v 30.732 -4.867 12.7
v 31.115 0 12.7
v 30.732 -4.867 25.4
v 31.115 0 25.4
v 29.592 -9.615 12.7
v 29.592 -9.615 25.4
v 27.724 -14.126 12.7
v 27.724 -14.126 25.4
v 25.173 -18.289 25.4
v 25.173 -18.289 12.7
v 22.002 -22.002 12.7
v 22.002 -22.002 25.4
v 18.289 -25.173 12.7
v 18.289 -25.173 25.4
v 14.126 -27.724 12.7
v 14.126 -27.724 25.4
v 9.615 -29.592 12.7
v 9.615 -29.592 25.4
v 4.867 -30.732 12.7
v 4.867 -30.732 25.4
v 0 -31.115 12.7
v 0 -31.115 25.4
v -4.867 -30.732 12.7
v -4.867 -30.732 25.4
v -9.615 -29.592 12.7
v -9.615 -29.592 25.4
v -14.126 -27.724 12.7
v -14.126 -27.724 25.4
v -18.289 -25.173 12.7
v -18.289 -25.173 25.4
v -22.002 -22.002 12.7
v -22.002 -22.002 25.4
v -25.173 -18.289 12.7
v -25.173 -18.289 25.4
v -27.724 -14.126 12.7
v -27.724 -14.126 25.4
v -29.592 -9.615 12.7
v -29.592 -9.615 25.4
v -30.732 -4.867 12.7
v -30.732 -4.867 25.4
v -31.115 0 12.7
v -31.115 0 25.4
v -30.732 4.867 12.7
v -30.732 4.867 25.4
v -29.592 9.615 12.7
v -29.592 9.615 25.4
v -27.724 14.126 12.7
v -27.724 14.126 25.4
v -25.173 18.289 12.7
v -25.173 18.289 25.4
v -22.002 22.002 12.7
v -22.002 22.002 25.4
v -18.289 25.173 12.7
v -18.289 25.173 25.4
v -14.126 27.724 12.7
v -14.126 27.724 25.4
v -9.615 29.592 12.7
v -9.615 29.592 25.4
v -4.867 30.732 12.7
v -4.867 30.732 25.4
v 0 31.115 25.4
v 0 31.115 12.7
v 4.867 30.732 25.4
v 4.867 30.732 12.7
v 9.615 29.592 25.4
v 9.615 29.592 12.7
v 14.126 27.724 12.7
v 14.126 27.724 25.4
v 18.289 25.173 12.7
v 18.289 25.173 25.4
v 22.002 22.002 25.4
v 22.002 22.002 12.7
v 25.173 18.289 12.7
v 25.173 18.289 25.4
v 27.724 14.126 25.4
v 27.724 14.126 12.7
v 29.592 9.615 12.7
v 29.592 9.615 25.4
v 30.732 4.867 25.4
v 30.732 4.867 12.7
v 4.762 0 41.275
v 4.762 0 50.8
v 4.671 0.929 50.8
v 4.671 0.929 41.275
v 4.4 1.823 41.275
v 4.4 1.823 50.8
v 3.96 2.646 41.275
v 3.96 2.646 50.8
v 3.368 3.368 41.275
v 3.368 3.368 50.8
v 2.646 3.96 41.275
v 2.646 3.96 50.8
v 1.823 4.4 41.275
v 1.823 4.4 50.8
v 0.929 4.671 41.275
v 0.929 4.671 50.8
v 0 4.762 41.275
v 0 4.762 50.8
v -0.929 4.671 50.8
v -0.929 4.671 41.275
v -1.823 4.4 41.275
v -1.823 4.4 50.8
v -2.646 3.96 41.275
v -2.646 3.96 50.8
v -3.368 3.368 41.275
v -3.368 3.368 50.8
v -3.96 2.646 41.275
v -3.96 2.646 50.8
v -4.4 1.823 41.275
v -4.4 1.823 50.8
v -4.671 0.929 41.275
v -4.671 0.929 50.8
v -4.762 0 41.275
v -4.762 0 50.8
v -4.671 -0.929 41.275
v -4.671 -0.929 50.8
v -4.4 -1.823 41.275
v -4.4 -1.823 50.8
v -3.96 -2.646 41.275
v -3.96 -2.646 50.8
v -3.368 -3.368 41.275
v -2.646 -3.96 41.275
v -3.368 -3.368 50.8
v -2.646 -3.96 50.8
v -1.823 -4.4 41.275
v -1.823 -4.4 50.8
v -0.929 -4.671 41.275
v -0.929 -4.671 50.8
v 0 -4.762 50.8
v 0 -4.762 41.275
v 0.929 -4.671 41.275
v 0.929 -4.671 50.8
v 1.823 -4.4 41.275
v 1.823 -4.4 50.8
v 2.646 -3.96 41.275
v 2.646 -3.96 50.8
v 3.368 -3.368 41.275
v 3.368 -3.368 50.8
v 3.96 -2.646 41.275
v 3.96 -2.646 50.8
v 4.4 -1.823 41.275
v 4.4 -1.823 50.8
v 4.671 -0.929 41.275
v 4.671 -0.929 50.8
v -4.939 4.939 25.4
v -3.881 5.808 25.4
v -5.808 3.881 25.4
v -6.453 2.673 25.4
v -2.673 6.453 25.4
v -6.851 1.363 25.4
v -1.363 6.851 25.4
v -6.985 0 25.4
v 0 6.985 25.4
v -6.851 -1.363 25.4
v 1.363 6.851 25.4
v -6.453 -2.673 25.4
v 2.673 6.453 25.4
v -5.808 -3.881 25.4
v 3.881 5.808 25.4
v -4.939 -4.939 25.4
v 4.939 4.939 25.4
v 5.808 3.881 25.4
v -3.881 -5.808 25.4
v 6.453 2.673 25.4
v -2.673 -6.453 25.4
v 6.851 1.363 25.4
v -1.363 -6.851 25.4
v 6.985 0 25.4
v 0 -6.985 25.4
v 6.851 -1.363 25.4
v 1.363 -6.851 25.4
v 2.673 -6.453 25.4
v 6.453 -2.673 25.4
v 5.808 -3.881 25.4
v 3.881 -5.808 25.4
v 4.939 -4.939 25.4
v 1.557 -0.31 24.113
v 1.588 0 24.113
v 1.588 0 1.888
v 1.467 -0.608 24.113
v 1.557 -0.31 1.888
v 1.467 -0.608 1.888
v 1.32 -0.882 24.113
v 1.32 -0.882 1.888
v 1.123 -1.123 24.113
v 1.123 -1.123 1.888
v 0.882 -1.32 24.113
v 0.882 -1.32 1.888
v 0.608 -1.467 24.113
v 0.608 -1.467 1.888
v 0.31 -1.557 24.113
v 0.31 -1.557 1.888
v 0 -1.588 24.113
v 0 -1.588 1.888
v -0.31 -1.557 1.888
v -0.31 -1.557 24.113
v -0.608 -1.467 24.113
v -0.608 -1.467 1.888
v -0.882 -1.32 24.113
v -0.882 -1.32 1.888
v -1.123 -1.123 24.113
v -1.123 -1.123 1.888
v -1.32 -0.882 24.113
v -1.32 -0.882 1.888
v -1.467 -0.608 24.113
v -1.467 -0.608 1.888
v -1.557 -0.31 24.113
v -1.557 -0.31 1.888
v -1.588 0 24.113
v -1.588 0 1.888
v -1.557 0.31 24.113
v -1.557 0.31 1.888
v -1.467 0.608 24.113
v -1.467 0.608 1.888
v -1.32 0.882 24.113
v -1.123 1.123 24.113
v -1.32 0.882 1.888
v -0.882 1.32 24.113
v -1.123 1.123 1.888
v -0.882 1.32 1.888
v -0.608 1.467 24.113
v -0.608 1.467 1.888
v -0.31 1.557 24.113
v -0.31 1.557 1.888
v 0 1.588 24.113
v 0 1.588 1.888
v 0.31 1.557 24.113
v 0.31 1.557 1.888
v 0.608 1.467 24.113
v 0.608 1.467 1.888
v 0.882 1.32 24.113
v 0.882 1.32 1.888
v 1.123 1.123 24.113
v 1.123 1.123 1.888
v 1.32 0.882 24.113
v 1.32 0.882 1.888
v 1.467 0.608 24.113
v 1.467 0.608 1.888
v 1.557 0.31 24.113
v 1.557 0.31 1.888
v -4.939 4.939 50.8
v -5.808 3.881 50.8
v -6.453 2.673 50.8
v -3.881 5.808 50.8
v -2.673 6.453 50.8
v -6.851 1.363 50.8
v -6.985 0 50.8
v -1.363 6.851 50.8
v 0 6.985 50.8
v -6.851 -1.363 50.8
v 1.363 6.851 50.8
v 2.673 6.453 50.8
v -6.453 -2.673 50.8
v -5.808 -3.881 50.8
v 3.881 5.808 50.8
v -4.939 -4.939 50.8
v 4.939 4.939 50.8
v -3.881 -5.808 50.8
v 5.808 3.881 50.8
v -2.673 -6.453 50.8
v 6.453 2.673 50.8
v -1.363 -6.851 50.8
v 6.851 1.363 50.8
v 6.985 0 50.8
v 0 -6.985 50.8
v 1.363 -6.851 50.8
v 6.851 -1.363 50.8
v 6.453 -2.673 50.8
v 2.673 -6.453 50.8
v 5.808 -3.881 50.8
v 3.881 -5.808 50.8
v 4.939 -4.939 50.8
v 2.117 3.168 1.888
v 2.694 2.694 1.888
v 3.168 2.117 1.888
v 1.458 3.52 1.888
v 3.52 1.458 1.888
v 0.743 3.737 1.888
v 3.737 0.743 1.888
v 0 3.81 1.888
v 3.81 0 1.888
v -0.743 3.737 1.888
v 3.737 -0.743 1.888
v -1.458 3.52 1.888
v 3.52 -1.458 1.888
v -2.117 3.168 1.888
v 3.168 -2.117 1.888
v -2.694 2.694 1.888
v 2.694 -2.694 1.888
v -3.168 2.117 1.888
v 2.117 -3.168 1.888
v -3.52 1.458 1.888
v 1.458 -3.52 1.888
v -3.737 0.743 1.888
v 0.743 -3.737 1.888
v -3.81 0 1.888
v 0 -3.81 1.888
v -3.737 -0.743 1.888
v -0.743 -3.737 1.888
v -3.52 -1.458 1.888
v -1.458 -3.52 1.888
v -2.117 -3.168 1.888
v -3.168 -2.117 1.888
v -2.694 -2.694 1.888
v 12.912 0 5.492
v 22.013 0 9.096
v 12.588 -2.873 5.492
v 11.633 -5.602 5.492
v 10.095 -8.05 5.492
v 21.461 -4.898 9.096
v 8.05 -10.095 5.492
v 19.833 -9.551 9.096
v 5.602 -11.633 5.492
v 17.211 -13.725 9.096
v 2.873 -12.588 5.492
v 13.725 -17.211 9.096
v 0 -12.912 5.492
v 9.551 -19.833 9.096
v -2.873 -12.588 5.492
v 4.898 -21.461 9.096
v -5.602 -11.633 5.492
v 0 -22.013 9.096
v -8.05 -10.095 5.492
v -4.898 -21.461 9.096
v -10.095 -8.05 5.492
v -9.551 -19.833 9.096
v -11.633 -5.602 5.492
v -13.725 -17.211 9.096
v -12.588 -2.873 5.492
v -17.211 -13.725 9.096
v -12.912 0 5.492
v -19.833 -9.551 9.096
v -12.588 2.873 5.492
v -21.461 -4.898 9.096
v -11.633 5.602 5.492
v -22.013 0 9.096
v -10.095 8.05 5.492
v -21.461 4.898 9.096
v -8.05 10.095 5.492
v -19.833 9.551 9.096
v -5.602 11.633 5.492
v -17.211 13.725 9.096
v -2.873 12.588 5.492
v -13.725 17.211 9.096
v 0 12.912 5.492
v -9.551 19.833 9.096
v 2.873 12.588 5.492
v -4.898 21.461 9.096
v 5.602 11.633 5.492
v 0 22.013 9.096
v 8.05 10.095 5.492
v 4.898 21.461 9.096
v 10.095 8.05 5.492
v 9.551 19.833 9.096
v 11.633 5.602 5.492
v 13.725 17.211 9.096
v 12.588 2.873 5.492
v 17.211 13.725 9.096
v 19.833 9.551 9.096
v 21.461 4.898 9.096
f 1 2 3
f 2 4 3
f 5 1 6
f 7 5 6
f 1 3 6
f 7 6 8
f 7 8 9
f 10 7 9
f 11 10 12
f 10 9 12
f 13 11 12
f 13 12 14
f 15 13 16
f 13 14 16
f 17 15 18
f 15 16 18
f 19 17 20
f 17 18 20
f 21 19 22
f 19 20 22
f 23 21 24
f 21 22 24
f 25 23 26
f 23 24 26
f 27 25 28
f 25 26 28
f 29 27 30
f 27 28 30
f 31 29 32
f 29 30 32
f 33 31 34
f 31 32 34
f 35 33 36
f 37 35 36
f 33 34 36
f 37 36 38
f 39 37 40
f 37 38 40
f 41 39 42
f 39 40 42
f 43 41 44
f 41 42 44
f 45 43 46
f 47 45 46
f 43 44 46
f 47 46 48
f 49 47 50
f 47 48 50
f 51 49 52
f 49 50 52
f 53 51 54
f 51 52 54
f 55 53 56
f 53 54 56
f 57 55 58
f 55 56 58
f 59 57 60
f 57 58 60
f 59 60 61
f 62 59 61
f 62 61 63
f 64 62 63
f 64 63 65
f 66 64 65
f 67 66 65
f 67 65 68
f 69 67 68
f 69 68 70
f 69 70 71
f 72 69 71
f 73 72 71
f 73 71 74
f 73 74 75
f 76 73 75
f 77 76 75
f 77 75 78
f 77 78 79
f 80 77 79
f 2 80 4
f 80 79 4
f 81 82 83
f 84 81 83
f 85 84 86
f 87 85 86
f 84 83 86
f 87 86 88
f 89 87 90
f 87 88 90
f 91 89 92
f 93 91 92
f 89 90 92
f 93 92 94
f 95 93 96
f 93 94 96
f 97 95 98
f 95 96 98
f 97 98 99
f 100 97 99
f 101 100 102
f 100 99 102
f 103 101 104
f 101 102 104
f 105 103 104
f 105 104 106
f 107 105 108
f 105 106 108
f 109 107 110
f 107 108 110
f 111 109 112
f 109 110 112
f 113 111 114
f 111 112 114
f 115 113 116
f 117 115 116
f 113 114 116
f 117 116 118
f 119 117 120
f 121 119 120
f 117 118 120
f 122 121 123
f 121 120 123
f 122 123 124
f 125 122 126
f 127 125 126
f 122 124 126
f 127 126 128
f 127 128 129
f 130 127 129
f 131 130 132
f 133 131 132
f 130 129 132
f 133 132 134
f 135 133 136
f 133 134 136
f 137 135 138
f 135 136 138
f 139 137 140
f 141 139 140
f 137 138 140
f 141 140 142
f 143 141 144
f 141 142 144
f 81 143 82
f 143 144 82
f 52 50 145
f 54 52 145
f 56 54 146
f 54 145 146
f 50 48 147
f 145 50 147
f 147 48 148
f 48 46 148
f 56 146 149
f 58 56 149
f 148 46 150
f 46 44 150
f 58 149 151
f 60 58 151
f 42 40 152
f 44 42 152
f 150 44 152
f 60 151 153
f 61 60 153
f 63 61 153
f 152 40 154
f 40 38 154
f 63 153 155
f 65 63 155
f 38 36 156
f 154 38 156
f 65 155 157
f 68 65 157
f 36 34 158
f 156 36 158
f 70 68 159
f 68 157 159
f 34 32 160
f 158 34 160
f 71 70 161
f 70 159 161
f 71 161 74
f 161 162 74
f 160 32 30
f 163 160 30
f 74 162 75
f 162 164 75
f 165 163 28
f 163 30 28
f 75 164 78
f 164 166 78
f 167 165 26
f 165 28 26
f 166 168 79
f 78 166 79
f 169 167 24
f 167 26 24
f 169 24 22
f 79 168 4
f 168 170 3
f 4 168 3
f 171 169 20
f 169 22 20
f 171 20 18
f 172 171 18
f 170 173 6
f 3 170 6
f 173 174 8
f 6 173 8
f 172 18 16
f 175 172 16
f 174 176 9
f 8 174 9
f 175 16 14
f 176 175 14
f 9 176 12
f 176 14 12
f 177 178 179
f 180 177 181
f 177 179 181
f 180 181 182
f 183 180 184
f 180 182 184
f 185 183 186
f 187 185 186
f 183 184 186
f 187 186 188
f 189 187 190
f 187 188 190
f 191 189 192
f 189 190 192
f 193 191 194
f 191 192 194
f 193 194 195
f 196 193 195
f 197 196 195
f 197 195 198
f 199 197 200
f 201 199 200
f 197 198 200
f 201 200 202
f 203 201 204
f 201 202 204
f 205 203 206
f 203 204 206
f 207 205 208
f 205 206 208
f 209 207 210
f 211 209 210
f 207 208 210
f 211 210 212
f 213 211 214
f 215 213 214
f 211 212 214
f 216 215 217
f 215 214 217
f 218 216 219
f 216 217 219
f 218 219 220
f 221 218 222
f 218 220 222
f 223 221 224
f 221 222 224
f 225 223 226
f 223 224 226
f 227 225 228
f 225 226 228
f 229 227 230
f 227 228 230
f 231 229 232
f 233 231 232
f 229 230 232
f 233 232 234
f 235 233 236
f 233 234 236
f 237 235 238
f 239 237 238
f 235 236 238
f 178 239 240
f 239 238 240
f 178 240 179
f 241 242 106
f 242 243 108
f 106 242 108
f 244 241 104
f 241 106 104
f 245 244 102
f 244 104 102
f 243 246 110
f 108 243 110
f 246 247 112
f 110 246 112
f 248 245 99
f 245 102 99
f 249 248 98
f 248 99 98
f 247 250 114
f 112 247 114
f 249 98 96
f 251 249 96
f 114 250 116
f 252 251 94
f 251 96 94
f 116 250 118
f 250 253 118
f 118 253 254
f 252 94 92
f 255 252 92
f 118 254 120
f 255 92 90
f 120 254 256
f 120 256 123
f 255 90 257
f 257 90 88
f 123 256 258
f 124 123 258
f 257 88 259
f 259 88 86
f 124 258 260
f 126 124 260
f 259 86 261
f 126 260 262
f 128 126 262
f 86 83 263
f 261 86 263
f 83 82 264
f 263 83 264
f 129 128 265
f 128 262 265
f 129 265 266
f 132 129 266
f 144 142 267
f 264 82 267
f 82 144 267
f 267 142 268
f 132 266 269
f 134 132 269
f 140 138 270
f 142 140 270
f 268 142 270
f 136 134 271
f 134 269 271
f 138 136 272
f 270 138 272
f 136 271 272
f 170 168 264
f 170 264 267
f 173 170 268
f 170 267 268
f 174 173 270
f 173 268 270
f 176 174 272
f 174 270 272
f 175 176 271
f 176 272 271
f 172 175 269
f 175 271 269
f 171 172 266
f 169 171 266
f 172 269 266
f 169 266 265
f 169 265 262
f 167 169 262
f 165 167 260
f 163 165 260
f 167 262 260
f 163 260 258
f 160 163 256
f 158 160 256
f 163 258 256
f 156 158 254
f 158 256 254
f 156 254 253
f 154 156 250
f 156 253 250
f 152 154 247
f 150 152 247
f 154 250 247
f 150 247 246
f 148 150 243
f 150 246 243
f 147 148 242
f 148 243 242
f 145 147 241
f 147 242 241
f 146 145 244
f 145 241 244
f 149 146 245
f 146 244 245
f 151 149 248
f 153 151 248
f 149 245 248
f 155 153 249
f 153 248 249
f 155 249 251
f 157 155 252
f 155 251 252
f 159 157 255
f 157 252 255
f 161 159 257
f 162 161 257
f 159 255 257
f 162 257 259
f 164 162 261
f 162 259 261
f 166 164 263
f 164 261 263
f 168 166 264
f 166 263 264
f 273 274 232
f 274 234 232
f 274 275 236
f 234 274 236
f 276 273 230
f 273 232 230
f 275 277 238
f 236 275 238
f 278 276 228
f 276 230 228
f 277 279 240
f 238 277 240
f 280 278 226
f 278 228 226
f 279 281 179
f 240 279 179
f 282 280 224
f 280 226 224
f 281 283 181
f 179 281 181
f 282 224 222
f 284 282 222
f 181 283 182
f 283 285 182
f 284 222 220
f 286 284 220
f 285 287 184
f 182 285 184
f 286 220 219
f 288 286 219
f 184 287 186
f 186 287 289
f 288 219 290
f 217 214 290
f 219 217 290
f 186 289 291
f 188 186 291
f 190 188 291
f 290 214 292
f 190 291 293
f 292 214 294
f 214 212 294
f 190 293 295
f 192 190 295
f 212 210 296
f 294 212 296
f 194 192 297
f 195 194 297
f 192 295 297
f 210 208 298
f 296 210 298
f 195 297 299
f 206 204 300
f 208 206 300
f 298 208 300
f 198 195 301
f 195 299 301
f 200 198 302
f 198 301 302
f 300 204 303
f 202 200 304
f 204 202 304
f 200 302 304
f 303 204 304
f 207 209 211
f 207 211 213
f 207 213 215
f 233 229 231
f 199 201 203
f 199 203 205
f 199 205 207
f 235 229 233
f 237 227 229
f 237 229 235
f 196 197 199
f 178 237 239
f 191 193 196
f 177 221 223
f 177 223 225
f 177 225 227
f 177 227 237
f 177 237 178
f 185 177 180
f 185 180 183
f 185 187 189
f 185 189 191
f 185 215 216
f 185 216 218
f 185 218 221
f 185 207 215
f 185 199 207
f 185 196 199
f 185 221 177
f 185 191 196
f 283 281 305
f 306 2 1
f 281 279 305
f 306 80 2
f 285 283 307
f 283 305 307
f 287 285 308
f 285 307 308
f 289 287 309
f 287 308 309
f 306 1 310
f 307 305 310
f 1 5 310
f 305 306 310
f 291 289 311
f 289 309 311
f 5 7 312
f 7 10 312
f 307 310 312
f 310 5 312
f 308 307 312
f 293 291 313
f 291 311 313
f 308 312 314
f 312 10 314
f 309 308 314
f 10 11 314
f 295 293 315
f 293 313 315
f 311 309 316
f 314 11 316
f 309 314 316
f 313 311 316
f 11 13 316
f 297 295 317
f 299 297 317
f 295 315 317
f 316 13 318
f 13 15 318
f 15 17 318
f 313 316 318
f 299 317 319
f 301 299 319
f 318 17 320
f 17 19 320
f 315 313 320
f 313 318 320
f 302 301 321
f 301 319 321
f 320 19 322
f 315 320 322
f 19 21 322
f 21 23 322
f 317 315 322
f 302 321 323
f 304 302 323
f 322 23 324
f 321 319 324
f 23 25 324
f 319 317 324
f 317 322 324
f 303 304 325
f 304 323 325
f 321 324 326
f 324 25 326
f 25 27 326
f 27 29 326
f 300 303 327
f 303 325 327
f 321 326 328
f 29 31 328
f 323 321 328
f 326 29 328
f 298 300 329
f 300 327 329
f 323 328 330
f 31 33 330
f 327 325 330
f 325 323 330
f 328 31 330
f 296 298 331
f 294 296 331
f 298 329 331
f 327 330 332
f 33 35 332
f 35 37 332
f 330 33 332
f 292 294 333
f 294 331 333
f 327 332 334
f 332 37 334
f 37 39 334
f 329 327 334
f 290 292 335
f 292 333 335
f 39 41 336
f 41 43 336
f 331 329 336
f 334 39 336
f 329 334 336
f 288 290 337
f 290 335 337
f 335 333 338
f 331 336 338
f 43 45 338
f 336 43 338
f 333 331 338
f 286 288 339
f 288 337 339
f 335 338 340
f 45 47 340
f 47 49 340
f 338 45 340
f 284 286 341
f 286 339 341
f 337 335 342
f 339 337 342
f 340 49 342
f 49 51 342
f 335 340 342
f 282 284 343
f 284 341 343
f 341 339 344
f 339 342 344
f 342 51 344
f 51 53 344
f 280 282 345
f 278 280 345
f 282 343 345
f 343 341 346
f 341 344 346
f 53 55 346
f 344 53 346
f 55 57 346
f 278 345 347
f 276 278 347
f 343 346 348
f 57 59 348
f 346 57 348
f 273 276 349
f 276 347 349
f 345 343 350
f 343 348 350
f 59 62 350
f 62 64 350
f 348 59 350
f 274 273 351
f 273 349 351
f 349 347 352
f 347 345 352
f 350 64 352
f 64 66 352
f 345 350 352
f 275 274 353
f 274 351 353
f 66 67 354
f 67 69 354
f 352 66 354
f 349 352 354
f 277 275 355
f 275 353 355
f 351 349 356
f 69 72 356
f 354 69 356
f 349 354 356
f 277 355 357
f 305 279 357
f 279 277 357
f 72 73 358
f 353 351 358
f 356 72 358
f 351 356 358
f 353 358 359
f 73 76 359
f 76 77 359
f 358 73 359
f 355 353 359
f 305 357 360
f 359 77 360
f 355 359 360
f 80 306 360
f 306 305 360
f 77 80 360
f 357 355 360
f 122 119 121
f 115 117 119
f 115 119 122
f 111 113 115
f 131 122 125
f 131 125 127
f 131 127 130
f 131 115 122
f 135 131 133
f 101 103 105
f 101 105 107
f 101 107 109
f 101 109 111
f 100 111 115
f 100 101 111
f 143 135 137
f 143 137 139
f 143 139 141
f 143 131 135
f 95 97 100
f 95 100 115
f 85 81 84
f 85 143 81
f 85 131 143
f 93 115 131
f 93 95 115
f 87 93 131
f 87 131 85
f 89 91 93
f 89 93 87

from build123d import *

# Parameters (mm, degrees)
F2_R     = 4.7625
F3_DEPTH = 9.525
F4_R     = 1.5875
F5_DEPTH = 22.225


with BuildPart() as f1:
    # F0 (on Front) → F1 (revolve)
    with BuildSketch(Plane.XZ):
        Polygon((3.81, 1.888357), (31.115, 12.7), (31.115, 25.4), (6.985, 25.4), (6.985, 50.8), (0, 50.8), (0, 1.888357), align=None)
    revolve(axis=Axis((0, 0, 26.344178), (0, 0, -1)))

    # F2 (on face) → F3 (cut)
    with BuildSketch(Plane.XY.offset(50.8)):
        Circle(F2_R)
    extrude(amount=-F3_DEPTH, mode=Mode.SUBTRACT)

    # F4 (on face) → F5 (cut)
    with BuildSketch(Plane(origin=(0, 0, 1.888357), x_dir=(1, 0, 0), z_dir=(0, 0, -1))):
        Circle(F4_R)
    extrude(amount=-F5_DEPTH, mode=Mode.SUBTRACT)


solid = f1.part
